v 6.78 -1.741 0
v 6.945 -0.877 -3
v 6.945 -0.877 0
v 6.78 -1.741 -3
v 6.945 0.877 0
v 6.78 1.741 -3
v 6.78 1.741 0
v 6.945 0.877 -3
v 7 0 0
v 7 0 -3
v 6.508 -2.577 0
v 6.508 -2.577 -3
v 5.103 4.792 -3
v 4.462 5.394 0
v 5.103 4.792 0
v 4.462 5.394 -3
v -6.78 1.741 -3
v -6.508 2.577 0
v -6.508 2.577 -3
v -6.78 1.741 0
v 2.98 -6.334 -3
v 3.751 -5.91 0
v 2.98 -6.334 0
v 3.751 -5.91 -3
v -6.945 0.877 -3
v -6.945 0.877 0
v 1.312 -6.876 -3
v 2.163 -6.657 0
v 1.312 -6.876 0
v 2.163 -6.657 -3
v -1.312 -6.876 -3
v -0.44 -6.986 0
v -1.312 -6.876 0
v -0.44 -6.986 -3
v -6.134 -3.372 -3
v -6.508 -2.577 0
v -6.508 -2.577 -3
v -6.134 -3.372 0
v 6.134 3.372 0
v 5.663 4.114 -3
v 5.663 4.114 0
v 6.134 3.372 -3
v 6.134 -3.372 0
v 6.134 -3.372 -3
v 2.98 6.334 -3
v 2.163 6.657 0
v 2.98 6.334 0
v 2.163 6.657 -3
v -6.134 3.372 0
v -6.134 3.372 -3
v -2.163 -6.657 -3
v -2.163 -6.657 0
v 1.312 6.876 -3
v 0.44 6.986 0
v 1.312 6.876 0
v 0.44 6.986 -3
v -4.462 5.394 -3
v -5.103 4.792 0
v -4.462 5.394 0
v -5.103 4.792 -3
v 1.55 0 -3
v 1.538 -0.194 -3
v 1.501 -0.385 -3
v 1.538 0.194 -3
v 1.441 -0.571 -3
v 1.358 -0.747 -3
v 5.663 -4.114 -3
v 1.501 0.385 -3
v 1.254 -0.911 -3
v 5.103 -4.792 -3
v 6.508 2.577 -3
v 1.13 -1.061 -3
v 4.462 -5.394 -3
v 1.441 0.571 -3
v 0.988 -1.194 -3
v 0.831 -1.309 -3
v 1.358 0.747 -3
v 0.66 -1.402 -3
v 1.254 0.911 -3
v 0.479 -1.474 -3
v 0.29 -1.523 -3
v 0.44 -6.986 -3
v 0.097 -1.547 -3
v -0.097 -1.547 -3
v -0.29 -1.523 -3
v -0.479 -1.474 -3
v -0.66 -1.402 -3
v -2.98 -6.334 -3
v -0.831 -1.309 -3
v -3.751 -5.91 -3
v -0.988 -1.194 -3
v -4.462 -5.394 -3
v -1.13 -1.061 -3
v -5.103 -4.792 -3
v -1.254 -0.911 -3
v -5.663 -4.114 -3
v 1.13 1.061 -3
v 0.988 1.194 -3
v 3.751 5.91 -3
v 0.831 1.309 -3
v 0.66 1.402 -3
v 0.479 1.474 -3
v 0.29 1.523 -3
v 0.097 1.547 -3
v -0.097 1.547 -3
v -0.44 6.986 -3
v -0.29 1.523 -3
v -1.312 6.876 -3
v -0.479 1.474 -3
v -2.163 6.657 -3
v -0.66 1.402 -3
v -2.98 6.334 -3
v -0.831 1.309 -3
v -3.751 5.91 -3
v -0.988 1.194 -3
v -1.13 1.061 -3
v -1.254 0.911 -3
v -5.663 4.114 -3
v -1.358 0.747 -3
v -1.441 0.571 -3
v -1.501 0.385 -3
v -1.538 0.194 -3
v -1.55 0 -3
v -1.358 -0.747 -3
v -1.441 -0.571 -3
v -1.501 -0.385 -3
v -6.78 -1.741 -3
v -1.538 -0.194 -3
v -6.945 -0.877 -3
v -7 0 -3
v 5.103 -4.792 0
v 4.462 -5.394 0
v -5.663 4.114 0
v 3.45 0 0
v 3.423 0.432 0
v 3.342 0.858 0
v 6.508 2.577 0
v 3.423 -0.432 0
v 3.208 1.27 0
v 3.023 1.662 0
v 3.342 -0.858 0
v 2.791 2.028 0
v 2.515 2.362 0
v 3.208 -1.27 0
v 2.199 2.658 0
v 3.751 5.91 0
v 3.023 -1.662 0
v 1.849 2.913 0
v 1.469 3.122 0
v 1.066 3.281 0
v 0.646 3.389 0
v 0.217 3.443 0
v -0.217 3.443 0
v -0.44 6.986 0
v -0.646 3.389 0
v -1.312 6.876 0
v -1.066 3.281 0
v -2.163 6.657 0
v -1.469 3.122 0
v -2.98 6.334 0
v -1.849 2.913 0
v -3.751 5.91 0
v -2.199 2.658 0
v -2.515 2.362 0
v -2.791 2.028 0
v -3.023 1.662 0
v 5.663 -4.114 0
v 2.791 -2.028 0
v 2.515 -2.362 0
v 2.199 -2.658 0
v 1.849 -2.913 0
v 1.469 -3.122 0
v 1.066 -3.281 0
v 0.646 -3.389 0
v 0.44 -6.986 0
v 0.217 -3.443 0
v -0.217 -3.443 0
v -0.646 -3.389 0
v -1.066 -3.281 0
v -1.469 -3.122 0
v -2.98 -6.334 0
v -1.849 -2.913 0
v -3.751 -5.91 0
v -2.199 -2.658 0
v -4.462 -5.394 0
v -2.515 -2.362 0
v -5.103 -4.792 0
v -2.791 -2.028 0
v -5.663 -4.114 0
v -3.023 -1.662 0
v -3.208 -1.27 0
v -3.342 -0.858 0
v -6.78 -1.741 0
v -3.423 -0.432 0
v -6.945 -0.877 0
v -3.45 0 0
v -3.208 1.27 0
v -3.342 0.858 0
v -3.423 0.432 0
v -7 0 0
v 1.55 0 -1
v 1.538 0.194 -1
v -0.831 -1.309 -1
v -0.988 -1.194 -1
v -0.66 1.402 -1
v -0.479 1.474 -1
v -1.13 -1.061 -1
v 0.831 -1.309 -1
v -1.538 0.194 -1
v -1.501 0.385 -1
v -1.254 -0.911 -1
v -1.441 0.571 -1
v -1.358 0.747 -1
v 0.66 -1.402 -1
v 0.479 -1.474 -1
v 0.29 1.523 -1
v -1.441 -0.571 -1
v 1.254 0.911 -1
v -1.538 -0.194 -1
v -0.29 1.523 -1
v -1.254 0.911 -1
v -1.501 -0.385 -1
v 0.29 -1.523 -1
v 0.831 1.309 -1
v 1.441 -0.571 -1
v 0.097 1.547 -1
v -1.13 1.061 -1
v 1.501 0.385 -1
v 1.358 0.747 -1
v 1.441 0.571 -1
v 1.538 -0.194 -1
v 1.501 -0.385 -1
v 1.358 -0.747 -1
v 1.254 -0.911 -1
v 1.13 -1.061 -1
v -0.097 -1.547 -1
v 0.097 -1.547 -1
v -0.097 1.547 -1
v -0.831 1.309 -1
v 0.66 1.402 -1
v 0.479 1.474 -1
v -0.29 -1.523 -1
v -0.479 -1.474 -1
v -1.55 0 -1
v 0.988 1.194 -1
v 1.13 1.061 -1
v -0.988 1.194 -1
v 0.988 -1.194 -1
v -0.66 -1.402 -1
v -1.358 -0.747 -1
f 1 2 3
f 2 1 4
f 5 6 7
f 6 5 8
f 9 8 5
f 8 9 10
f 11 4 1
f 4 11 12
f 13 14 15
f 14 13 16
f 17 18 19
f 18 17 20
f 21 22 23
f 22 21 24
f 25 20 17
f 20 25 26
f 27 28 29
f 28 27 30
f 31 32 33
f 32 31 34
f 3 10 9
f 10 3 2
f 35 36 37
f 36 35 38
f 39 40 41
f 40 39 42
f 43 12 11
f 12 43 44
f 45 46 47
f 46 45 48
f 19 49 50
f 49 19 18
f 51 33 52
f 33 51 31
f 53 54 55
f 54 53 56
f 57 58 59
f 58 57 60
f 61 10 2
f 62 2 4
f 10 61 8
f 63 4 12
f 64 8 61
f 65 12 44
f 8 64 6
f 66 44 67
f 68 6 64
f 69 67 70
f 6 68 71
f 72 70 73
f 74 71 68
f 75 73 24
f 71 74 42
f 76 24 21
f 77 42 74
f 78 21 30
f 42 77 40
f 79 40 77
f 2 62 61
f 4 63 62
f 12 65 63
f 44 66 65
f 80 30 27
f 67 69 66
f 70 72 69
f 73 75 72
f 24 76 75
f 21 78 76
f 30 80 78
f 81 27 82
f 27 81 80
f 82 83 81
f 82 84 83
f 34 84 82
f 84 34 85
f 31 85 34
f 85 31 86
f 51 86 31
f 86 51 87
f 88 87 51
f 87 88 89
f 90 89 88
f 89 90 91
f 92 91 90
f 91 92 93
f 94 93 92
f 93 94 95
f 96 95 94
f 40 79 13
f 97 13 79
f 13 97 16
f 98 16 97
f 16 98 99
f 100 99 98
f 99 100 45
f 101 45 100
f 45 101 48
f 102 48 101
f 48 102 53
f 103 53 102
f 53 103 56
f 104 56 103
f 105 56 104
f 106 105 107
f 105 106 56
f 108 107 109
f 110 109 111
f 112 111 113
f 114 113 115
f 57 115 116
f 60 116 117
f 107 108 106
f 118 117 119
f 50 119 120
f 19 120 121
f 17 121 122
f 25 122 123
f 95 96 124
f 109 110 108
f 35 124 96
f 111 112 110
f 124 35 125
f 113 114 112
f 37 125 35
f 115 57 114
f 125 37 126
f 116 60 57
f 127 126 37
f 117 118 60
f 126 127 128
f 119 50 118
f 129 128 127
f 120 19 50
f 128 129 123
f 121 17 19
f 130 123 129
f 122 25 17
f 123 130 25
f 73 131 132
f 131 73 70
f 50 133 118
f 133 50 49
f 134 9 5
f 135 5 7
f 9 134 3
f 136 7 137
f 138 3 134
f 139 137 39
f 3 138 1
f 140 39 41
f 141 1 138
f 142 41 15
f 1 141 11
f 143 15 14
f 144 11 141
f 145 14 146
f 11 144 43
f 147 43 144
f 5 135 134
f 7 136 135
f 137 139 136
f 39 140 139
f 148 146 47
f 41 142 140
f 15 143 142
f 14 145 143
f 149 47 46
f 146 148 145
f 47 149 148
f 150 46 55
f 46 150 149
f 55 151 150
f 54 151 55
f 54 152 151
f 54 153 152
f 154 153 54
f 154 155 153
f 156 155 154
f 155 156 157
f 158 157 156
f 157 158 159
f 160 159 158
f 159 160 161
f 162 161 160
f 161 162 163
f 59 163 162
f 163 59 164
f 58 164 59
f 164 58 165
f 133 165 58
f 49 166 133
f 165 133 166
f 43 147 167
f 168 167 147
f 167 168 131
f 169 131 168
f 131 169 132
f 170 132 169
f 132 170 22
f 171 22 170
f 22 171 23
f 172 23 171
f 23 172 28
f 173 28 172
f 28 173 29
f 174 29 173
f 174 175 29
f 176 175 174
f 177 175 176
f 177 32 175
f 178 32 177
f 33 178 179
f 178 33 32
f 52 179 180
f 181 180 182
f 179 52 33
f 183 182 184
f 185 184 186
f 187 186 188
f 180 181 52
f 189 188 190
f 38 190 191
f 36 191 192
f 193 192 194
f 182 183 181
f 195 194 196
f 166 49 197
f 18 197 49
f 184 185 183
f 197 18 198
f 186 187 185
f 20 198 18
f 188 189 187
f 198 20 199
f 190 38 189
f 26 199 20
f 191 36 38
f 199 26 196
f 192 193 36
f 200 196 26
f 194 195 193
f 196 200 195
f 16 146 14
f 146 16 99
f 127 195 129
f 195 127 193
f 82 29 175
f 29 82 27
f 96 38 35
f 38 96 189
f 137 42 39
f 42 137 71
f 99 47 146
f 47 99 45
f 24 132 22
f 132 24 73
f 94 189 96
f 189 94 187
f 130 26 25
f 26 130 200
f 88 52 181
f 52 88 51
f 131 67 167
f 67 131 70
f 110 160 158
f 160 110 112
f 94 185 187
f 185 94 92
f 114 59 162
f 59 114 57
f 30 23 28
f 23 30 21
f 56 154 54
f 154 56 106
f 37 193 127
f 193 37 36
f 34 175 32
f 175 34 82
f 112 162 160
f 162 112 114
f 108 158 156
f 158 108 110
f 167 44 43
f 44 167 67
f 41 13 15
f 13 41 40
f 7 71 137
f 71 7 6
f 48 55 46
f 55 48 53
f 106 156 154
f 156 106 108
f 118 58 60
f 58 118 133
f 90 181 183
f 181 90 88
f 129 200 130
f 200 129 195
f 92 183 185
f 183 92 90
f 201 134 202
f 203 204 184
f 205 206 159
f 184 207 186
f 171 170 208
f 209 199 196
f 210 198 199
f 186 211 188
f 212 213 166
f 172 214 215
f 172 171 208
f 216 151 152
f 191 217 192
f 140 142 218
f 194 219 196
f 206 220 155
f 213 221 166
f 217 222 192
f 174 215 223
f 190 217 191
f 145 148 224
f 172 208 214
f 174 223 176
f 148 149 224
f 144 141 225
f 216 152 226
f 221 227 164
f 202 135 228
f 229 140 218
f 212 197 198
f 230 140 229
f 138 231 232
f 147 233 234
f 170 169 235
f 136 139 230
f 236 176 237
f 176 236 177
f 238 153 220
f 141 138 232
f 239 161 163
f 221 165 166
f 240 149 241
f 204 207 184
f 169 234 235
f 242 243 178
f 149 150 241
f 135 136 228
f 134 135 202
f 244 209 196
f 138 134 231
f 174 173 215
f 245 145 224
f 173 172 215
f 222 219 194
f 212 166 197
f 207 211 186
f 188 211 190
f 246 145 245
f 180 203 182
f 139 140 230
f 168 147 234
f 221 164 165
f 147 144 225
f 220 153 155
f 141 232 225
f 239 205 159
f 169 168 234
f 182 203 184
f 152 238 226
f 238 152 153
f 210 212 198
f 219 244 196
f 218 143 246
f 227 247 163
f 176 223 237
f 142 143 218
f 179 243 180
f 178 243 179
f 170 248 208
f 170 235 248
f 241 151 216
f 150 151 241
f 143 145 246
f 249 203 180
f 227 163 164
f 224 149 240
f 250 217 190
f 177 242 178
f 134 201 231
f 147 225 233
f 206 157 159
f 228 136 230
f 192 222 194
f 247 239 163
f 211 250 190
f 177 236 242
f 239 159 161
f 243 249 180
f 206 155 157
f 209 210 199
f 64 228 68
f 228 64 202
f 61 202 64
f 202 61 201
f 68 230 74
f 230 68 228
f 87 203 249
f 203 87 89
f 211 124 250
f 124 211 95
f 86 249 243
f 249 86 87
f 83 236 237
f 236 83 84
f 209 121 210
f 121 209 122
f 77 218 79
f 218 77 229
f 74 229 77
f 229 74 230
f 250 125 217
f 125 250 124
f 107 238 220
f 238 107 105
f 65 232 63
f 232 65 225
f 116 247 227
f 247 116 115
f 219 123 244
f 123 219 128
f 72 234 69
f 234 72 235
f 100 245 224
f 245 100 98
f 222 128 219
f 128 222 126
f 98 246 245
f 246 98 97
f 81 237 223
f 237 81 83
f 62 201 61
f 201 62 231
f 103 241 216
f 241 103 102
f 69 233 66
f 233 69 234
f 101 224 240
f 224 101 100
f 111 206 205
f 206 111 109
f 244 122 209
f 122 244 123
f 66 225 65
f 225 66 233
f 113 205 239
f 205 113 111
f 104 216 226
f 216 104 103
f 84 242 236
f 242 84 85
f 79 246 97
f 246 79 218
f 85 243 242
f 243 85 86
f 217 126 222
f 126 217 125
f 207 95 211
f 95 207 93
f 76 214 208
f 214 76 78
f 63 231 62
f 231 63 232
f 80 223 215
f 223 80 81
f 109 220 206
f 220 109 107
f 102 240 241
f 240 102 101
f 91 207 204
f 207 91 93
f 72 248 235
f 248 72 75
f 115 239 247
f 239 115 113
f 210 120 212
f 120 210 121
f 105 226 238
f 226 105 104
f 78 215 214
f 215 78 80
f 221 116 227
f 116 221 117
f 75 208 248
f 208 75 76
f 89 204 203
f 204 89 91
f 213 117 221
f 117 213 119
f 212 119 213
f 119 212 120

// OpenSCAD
$fn = 50;


difference() {
	union() {
		translate(v = [0, 0, -3.0000000000]) {
			cylinder(h = 3, r = 7.0000000000);
		}
		translate(v = [0, 0, -3.0000000000]) {
			cylinder(h = 3, r = 2.8750000000);
		}
	}
	union() {
		translate(v = [0, 0, 0]) {
			rotate(a = [0, 0, 0]) {
				difference() {
					union() {
						translate(v = [0, 0, -3.0000000000]) {
							cylinder(h = 3, r = 1.2500000000);
						}
						translate(v = [0, 0, -1.0000000000]) {
							cylinder(h = 1.0000000000, r1 = 1.5500000000, r2 = 3.4500000000);
						}
						translate(v = [0, 0, -3.0000000000]) {
							cylinder(h = 3, r = 1.5500000000);
						}
						translate(v = [0, 0, -3.0000000000]) {
							cylinder(h = 3, r = 1.2500000000);
						}
					}
					union();
				}
			}
		}
	}
}
